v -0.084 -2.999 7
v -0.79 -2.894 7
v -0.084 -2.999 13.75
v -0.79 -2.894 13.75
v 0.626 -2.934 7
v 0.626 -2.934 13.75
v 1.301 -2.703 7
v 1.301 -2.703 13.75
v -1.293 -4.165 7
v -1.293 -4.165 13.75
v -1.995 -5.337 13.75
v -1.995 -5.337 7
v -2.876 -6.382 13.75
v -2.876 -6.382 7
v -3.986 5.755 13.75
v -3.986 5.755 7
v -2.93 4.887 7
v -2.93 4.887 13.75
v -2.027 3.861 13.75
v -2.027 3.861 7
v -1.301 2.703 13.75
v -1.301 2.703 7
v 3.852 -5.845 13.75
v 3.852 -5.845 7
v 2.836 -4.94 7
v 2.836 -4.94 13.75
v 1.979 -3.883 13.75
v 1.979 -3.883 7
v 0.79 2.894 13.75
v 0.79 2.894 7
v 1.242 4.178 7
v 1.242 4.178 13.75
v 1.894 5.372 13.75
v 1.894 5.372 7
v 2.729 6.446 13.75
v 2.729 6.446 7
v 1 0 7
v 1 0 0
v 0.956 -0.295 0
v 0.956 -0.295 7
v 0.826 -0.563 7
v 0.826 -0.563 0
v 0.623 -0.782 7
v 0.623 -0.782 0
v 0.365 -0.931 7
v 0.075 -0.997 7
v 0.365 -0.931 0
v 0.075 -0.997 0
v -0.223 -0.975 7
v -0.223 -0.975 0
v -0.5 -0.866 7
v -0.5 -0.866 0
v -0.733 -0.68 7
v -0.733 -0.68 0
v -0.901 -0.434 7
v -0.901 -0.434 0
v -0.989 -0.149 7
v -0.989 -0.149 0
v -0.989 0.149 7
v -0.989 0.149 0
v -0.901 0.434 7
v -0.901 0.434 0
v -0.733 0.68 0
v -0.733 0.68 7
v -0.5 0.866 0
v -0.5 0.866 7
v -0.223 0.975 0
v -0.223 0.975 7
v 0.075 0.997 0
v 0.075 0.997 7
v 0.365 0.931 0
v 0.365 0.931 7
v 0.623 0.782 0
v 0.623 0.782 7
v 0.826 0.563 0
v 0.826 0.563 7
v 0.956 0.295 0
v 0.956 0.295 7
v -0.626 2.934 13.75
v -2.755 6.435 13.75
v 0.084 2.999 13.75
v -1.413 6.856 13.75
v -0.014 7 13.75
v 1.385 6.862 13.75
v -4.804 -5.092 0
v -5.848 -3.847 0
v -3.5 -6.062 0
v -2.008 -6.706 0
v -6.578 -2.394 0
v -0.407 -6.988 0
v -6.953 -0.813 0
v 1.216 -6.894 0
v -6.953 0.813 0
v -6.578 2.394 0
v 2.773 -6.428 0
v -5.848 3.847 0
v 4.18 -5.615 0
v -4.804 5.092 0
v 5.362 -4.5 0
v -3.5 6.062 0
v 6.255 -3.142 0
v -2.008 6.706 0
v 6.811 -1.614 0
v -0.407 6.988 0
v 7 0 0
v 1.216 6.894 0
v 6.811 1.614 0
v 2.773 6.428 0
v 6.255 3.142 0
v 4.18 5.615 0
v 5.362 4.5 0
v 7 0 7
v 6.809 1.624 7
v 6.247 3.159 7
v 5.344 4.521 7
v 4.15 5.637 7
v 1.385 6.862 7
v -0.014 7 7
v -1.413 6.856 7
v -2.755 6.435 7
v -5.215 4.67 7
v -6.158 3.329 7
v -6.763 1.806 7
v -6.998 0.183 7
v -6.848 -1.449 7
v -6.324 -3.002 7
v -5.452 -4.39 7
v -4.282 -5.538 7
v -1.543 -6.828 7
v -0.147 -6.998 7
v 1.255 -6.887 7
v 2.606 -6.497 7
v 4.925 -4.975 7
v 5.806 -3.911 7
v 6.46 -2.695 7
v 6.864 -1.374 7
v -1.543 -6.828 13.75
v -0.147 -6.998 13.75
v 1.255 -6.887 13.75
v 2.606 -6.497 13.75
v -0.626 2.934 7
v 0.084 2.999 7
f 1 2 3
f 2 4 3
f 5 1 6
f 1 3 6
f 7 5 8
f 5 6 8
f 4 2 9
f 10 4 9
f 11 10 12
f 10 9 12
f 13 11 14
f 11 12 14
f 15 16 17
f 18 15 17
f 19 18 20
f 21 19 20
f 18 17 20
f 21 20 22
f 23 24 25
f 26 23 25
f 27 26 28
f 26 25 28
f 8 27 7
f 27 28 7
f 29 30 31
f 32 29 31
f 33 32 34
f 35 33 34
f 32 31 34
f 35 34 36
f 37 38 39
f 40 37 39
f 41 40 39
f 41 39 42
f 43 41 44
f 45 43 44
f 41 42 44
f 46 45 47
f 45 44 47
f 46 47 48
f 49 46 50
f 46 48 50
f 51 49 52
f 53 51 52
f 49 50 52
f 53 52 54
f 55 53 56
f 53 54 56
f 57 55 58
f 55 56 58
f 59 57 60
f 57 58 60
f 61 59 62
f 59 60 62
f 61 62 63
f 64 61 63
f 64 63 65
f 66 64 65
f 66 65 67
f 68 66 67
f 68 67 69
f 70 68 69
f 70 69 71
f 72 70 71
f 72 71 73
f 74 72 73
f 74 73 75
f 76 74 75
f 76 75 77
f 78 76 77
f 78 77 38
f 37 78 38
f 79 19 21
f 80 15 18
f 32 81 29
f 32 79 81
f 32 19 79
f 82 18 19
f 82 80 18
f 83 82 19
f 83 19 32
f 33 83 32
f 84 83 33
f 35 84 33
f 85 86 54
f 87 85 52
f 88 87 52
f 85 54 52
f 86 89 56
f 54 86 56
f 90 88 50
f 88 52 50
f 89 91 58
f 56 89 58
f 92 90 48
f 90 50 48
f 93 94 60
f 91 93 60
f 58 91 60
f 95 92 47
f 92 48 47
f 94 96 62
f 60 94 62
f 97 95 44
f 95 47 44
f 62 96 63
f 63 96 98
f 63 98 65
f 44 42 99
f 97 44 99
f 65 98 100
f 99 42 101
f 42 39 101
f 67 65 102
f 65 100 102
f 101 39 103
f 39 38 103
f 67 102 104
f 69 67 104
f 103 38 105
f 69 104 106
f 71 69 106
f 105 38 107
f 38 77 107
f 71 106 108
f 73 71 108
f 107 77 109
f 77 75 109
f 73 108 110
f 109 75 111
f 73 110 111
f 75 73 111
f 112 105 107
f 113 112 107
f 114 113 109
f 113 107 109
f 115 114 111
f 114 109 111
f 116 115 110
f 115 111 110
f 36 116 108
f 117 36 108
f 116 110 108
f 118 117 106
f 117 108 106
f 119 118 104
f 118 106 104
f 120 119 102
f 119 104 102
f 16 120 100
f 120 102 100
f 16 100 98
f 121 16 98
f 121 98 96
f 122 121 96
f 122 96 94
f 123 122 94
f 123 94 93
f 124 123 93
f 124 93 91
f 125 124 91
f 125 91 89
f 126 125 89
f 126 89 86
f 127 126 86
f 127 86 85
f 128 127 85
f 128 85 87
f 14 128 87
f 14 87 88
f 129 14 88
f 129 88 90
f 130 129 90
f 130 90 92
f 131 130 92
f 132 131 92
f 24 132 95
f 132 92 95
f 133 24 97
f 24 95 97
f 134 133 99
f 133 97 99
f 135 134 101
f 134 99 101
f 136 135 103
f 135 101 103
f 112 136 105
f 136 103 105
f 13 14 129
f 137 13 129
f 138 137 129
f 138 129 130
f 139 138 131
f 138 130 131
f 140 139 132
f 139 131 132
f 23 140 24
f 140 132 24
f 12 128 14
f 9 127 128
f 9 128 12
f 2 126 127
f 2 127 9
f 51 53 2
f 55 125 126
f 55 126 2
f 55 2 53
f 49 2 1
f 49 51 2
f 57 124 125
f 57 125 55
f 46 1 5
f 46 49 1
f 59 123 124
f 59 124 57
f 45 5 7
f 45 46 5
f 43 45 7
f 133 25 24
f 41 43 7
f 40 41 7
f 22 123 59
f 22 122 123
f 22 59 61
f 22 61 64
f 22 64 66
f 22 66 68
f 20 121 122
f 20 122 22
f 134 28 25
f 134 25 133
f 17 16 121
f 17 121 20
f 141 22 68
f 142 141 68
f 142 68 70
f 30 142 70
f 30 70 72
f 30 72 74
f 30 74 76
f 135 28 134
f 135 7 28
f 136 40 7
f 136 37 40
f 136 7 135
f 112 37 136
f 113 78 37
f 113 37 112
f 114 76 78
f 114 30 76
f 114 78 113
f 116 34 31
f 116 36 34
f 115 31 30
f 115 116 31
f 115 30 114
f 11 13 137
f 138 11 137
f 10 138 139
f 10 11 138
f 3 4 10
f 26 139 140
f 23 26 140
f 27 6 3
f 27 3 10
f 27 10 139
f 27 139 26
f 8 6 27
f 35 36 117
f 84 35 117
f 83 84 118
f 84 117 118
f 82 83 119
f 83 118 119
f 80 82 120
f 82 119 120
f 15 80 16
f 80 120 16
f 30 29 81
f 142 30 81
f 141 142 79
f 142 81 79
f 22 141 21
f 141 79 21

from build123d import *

# Parameters (mm, degrees)
F0_R     = 7
F1_DEPTH = 7
F3_DEPTH = 6.75
F4_R     = 3
F5_DEPTH = 6.75
F6_R     = 1
F7_DEPTH = 13.751


with BuildPart() as f1:
    # F0 (on Top) → F1 (new body)
    with BuildSketch(Plane.XY):
        Circle(F0_R)
    extrude(amount=F1_DEPTH)

    # F2 (on face) → F3 (join)
    with BuildSketch(Plane.XY.offset(7)):
        with BuildLine():
            ThreePointArc((2.9875473685, 0.273058091), (2.2988535655, 1.9275041594), (0.7898544942, 2.8941544323))
            ThreePointArc((0.7898544942, 2.8941544323), (-0.273058091, 2.9875473685), (-1.3014286637, 2.7030137686))
            ThreePointArc((-1.3014286637, 2.7030137686), (-2.6101876905, 1.4788239315), (-2.9875473685, -0.273058091))
            Line((-2.9875473685, -0.273058091), (2.9875473685, 0.273058091))
        make_face()
        with BuildLine():
            ThreePointArc((-1.3014286637, 2.7030137686), (-0.273058091, 2.9875473685), (0.7898544942, 2.8941544323))
            ThreePointArc((0.7898544942, 2.8941544323), (1.5438295644, 4.7878332543), (2.7289268388, 6.4461584148))
            ThreePointArc((2.7289268388, 6.4461584148), (-0.7171765928, 6.9631643478), (-3.9855530681, 5.7545952717))
            ThreePointArc((-3.9855530681, 5.7545952717), (-2.4574856727, 4.3924118424), (-1.3014286637, 2.7030137686))
        make_face()
        with BuildLine():
            ThreePointArc((3, 0), (2.9968852252, 0.1366709452), (2.9875473685, 0.273058091))
            Line((2.9875473685, 0.273058091), (-2.9875473685, -0.273058091))
            ThreePointArc((-2.9875473685, -0.273058091), (-2.2988535655, -1.9275041594), (-0.7898544942, -2.8941544323))
            ThreePointArc((-0.7898544942, -2.8941544323), (0.273058091, -2.9875473685), (1.3014286637, -2.7030137686))
            ThreePointArc((1.3014286637, -2.7030137686), (2.5401068867, -1.5962008033), (3, 0))
        make_face()
        with BuildLine():
            ThreePointArc((1.3014286637, -2.7030137686), (0.273058091, -2.9875473685), (-0.7898544942, -2.8941544323))
            ThreePointArc((-0.7898544942, -2.8941544323), (-1.6204974061, -4.7651343928), (-2.8763053334, -6.3817605431))
            ThreePointArc((-2.8763053334, -6.3817605431), (0.5570104085, -6.9778033366), (3.8522907412, -5.8446433634))
            ThreePointArc((3.8522907412, -5.8446433634), (2.3862030644, -4.4286331899), (1.3014286637, -2.7030137686))
        make_face()
    extrude(amount=F3_DEPTH)

    # F4 (on face) → F5 (cut)
    with BuildSketch(Plane.XY.offset(13.75)):
        Circle(F4_R)
    extrude(amount=-F5_DEPTH, mode=Mode.SUBTRACT)

    # F6 (on face) → F7 (cut, through all)
    with BuildSketch(Plane(origin=(0, 0, 0), x_dir=(1, 0, 0), z_dir=(0, 0, -1))):
        Circle(F6_R)
    extrude(amount=-F7_DEPTH, mode=Mode.SUBTRACT)


solid = f1.part
